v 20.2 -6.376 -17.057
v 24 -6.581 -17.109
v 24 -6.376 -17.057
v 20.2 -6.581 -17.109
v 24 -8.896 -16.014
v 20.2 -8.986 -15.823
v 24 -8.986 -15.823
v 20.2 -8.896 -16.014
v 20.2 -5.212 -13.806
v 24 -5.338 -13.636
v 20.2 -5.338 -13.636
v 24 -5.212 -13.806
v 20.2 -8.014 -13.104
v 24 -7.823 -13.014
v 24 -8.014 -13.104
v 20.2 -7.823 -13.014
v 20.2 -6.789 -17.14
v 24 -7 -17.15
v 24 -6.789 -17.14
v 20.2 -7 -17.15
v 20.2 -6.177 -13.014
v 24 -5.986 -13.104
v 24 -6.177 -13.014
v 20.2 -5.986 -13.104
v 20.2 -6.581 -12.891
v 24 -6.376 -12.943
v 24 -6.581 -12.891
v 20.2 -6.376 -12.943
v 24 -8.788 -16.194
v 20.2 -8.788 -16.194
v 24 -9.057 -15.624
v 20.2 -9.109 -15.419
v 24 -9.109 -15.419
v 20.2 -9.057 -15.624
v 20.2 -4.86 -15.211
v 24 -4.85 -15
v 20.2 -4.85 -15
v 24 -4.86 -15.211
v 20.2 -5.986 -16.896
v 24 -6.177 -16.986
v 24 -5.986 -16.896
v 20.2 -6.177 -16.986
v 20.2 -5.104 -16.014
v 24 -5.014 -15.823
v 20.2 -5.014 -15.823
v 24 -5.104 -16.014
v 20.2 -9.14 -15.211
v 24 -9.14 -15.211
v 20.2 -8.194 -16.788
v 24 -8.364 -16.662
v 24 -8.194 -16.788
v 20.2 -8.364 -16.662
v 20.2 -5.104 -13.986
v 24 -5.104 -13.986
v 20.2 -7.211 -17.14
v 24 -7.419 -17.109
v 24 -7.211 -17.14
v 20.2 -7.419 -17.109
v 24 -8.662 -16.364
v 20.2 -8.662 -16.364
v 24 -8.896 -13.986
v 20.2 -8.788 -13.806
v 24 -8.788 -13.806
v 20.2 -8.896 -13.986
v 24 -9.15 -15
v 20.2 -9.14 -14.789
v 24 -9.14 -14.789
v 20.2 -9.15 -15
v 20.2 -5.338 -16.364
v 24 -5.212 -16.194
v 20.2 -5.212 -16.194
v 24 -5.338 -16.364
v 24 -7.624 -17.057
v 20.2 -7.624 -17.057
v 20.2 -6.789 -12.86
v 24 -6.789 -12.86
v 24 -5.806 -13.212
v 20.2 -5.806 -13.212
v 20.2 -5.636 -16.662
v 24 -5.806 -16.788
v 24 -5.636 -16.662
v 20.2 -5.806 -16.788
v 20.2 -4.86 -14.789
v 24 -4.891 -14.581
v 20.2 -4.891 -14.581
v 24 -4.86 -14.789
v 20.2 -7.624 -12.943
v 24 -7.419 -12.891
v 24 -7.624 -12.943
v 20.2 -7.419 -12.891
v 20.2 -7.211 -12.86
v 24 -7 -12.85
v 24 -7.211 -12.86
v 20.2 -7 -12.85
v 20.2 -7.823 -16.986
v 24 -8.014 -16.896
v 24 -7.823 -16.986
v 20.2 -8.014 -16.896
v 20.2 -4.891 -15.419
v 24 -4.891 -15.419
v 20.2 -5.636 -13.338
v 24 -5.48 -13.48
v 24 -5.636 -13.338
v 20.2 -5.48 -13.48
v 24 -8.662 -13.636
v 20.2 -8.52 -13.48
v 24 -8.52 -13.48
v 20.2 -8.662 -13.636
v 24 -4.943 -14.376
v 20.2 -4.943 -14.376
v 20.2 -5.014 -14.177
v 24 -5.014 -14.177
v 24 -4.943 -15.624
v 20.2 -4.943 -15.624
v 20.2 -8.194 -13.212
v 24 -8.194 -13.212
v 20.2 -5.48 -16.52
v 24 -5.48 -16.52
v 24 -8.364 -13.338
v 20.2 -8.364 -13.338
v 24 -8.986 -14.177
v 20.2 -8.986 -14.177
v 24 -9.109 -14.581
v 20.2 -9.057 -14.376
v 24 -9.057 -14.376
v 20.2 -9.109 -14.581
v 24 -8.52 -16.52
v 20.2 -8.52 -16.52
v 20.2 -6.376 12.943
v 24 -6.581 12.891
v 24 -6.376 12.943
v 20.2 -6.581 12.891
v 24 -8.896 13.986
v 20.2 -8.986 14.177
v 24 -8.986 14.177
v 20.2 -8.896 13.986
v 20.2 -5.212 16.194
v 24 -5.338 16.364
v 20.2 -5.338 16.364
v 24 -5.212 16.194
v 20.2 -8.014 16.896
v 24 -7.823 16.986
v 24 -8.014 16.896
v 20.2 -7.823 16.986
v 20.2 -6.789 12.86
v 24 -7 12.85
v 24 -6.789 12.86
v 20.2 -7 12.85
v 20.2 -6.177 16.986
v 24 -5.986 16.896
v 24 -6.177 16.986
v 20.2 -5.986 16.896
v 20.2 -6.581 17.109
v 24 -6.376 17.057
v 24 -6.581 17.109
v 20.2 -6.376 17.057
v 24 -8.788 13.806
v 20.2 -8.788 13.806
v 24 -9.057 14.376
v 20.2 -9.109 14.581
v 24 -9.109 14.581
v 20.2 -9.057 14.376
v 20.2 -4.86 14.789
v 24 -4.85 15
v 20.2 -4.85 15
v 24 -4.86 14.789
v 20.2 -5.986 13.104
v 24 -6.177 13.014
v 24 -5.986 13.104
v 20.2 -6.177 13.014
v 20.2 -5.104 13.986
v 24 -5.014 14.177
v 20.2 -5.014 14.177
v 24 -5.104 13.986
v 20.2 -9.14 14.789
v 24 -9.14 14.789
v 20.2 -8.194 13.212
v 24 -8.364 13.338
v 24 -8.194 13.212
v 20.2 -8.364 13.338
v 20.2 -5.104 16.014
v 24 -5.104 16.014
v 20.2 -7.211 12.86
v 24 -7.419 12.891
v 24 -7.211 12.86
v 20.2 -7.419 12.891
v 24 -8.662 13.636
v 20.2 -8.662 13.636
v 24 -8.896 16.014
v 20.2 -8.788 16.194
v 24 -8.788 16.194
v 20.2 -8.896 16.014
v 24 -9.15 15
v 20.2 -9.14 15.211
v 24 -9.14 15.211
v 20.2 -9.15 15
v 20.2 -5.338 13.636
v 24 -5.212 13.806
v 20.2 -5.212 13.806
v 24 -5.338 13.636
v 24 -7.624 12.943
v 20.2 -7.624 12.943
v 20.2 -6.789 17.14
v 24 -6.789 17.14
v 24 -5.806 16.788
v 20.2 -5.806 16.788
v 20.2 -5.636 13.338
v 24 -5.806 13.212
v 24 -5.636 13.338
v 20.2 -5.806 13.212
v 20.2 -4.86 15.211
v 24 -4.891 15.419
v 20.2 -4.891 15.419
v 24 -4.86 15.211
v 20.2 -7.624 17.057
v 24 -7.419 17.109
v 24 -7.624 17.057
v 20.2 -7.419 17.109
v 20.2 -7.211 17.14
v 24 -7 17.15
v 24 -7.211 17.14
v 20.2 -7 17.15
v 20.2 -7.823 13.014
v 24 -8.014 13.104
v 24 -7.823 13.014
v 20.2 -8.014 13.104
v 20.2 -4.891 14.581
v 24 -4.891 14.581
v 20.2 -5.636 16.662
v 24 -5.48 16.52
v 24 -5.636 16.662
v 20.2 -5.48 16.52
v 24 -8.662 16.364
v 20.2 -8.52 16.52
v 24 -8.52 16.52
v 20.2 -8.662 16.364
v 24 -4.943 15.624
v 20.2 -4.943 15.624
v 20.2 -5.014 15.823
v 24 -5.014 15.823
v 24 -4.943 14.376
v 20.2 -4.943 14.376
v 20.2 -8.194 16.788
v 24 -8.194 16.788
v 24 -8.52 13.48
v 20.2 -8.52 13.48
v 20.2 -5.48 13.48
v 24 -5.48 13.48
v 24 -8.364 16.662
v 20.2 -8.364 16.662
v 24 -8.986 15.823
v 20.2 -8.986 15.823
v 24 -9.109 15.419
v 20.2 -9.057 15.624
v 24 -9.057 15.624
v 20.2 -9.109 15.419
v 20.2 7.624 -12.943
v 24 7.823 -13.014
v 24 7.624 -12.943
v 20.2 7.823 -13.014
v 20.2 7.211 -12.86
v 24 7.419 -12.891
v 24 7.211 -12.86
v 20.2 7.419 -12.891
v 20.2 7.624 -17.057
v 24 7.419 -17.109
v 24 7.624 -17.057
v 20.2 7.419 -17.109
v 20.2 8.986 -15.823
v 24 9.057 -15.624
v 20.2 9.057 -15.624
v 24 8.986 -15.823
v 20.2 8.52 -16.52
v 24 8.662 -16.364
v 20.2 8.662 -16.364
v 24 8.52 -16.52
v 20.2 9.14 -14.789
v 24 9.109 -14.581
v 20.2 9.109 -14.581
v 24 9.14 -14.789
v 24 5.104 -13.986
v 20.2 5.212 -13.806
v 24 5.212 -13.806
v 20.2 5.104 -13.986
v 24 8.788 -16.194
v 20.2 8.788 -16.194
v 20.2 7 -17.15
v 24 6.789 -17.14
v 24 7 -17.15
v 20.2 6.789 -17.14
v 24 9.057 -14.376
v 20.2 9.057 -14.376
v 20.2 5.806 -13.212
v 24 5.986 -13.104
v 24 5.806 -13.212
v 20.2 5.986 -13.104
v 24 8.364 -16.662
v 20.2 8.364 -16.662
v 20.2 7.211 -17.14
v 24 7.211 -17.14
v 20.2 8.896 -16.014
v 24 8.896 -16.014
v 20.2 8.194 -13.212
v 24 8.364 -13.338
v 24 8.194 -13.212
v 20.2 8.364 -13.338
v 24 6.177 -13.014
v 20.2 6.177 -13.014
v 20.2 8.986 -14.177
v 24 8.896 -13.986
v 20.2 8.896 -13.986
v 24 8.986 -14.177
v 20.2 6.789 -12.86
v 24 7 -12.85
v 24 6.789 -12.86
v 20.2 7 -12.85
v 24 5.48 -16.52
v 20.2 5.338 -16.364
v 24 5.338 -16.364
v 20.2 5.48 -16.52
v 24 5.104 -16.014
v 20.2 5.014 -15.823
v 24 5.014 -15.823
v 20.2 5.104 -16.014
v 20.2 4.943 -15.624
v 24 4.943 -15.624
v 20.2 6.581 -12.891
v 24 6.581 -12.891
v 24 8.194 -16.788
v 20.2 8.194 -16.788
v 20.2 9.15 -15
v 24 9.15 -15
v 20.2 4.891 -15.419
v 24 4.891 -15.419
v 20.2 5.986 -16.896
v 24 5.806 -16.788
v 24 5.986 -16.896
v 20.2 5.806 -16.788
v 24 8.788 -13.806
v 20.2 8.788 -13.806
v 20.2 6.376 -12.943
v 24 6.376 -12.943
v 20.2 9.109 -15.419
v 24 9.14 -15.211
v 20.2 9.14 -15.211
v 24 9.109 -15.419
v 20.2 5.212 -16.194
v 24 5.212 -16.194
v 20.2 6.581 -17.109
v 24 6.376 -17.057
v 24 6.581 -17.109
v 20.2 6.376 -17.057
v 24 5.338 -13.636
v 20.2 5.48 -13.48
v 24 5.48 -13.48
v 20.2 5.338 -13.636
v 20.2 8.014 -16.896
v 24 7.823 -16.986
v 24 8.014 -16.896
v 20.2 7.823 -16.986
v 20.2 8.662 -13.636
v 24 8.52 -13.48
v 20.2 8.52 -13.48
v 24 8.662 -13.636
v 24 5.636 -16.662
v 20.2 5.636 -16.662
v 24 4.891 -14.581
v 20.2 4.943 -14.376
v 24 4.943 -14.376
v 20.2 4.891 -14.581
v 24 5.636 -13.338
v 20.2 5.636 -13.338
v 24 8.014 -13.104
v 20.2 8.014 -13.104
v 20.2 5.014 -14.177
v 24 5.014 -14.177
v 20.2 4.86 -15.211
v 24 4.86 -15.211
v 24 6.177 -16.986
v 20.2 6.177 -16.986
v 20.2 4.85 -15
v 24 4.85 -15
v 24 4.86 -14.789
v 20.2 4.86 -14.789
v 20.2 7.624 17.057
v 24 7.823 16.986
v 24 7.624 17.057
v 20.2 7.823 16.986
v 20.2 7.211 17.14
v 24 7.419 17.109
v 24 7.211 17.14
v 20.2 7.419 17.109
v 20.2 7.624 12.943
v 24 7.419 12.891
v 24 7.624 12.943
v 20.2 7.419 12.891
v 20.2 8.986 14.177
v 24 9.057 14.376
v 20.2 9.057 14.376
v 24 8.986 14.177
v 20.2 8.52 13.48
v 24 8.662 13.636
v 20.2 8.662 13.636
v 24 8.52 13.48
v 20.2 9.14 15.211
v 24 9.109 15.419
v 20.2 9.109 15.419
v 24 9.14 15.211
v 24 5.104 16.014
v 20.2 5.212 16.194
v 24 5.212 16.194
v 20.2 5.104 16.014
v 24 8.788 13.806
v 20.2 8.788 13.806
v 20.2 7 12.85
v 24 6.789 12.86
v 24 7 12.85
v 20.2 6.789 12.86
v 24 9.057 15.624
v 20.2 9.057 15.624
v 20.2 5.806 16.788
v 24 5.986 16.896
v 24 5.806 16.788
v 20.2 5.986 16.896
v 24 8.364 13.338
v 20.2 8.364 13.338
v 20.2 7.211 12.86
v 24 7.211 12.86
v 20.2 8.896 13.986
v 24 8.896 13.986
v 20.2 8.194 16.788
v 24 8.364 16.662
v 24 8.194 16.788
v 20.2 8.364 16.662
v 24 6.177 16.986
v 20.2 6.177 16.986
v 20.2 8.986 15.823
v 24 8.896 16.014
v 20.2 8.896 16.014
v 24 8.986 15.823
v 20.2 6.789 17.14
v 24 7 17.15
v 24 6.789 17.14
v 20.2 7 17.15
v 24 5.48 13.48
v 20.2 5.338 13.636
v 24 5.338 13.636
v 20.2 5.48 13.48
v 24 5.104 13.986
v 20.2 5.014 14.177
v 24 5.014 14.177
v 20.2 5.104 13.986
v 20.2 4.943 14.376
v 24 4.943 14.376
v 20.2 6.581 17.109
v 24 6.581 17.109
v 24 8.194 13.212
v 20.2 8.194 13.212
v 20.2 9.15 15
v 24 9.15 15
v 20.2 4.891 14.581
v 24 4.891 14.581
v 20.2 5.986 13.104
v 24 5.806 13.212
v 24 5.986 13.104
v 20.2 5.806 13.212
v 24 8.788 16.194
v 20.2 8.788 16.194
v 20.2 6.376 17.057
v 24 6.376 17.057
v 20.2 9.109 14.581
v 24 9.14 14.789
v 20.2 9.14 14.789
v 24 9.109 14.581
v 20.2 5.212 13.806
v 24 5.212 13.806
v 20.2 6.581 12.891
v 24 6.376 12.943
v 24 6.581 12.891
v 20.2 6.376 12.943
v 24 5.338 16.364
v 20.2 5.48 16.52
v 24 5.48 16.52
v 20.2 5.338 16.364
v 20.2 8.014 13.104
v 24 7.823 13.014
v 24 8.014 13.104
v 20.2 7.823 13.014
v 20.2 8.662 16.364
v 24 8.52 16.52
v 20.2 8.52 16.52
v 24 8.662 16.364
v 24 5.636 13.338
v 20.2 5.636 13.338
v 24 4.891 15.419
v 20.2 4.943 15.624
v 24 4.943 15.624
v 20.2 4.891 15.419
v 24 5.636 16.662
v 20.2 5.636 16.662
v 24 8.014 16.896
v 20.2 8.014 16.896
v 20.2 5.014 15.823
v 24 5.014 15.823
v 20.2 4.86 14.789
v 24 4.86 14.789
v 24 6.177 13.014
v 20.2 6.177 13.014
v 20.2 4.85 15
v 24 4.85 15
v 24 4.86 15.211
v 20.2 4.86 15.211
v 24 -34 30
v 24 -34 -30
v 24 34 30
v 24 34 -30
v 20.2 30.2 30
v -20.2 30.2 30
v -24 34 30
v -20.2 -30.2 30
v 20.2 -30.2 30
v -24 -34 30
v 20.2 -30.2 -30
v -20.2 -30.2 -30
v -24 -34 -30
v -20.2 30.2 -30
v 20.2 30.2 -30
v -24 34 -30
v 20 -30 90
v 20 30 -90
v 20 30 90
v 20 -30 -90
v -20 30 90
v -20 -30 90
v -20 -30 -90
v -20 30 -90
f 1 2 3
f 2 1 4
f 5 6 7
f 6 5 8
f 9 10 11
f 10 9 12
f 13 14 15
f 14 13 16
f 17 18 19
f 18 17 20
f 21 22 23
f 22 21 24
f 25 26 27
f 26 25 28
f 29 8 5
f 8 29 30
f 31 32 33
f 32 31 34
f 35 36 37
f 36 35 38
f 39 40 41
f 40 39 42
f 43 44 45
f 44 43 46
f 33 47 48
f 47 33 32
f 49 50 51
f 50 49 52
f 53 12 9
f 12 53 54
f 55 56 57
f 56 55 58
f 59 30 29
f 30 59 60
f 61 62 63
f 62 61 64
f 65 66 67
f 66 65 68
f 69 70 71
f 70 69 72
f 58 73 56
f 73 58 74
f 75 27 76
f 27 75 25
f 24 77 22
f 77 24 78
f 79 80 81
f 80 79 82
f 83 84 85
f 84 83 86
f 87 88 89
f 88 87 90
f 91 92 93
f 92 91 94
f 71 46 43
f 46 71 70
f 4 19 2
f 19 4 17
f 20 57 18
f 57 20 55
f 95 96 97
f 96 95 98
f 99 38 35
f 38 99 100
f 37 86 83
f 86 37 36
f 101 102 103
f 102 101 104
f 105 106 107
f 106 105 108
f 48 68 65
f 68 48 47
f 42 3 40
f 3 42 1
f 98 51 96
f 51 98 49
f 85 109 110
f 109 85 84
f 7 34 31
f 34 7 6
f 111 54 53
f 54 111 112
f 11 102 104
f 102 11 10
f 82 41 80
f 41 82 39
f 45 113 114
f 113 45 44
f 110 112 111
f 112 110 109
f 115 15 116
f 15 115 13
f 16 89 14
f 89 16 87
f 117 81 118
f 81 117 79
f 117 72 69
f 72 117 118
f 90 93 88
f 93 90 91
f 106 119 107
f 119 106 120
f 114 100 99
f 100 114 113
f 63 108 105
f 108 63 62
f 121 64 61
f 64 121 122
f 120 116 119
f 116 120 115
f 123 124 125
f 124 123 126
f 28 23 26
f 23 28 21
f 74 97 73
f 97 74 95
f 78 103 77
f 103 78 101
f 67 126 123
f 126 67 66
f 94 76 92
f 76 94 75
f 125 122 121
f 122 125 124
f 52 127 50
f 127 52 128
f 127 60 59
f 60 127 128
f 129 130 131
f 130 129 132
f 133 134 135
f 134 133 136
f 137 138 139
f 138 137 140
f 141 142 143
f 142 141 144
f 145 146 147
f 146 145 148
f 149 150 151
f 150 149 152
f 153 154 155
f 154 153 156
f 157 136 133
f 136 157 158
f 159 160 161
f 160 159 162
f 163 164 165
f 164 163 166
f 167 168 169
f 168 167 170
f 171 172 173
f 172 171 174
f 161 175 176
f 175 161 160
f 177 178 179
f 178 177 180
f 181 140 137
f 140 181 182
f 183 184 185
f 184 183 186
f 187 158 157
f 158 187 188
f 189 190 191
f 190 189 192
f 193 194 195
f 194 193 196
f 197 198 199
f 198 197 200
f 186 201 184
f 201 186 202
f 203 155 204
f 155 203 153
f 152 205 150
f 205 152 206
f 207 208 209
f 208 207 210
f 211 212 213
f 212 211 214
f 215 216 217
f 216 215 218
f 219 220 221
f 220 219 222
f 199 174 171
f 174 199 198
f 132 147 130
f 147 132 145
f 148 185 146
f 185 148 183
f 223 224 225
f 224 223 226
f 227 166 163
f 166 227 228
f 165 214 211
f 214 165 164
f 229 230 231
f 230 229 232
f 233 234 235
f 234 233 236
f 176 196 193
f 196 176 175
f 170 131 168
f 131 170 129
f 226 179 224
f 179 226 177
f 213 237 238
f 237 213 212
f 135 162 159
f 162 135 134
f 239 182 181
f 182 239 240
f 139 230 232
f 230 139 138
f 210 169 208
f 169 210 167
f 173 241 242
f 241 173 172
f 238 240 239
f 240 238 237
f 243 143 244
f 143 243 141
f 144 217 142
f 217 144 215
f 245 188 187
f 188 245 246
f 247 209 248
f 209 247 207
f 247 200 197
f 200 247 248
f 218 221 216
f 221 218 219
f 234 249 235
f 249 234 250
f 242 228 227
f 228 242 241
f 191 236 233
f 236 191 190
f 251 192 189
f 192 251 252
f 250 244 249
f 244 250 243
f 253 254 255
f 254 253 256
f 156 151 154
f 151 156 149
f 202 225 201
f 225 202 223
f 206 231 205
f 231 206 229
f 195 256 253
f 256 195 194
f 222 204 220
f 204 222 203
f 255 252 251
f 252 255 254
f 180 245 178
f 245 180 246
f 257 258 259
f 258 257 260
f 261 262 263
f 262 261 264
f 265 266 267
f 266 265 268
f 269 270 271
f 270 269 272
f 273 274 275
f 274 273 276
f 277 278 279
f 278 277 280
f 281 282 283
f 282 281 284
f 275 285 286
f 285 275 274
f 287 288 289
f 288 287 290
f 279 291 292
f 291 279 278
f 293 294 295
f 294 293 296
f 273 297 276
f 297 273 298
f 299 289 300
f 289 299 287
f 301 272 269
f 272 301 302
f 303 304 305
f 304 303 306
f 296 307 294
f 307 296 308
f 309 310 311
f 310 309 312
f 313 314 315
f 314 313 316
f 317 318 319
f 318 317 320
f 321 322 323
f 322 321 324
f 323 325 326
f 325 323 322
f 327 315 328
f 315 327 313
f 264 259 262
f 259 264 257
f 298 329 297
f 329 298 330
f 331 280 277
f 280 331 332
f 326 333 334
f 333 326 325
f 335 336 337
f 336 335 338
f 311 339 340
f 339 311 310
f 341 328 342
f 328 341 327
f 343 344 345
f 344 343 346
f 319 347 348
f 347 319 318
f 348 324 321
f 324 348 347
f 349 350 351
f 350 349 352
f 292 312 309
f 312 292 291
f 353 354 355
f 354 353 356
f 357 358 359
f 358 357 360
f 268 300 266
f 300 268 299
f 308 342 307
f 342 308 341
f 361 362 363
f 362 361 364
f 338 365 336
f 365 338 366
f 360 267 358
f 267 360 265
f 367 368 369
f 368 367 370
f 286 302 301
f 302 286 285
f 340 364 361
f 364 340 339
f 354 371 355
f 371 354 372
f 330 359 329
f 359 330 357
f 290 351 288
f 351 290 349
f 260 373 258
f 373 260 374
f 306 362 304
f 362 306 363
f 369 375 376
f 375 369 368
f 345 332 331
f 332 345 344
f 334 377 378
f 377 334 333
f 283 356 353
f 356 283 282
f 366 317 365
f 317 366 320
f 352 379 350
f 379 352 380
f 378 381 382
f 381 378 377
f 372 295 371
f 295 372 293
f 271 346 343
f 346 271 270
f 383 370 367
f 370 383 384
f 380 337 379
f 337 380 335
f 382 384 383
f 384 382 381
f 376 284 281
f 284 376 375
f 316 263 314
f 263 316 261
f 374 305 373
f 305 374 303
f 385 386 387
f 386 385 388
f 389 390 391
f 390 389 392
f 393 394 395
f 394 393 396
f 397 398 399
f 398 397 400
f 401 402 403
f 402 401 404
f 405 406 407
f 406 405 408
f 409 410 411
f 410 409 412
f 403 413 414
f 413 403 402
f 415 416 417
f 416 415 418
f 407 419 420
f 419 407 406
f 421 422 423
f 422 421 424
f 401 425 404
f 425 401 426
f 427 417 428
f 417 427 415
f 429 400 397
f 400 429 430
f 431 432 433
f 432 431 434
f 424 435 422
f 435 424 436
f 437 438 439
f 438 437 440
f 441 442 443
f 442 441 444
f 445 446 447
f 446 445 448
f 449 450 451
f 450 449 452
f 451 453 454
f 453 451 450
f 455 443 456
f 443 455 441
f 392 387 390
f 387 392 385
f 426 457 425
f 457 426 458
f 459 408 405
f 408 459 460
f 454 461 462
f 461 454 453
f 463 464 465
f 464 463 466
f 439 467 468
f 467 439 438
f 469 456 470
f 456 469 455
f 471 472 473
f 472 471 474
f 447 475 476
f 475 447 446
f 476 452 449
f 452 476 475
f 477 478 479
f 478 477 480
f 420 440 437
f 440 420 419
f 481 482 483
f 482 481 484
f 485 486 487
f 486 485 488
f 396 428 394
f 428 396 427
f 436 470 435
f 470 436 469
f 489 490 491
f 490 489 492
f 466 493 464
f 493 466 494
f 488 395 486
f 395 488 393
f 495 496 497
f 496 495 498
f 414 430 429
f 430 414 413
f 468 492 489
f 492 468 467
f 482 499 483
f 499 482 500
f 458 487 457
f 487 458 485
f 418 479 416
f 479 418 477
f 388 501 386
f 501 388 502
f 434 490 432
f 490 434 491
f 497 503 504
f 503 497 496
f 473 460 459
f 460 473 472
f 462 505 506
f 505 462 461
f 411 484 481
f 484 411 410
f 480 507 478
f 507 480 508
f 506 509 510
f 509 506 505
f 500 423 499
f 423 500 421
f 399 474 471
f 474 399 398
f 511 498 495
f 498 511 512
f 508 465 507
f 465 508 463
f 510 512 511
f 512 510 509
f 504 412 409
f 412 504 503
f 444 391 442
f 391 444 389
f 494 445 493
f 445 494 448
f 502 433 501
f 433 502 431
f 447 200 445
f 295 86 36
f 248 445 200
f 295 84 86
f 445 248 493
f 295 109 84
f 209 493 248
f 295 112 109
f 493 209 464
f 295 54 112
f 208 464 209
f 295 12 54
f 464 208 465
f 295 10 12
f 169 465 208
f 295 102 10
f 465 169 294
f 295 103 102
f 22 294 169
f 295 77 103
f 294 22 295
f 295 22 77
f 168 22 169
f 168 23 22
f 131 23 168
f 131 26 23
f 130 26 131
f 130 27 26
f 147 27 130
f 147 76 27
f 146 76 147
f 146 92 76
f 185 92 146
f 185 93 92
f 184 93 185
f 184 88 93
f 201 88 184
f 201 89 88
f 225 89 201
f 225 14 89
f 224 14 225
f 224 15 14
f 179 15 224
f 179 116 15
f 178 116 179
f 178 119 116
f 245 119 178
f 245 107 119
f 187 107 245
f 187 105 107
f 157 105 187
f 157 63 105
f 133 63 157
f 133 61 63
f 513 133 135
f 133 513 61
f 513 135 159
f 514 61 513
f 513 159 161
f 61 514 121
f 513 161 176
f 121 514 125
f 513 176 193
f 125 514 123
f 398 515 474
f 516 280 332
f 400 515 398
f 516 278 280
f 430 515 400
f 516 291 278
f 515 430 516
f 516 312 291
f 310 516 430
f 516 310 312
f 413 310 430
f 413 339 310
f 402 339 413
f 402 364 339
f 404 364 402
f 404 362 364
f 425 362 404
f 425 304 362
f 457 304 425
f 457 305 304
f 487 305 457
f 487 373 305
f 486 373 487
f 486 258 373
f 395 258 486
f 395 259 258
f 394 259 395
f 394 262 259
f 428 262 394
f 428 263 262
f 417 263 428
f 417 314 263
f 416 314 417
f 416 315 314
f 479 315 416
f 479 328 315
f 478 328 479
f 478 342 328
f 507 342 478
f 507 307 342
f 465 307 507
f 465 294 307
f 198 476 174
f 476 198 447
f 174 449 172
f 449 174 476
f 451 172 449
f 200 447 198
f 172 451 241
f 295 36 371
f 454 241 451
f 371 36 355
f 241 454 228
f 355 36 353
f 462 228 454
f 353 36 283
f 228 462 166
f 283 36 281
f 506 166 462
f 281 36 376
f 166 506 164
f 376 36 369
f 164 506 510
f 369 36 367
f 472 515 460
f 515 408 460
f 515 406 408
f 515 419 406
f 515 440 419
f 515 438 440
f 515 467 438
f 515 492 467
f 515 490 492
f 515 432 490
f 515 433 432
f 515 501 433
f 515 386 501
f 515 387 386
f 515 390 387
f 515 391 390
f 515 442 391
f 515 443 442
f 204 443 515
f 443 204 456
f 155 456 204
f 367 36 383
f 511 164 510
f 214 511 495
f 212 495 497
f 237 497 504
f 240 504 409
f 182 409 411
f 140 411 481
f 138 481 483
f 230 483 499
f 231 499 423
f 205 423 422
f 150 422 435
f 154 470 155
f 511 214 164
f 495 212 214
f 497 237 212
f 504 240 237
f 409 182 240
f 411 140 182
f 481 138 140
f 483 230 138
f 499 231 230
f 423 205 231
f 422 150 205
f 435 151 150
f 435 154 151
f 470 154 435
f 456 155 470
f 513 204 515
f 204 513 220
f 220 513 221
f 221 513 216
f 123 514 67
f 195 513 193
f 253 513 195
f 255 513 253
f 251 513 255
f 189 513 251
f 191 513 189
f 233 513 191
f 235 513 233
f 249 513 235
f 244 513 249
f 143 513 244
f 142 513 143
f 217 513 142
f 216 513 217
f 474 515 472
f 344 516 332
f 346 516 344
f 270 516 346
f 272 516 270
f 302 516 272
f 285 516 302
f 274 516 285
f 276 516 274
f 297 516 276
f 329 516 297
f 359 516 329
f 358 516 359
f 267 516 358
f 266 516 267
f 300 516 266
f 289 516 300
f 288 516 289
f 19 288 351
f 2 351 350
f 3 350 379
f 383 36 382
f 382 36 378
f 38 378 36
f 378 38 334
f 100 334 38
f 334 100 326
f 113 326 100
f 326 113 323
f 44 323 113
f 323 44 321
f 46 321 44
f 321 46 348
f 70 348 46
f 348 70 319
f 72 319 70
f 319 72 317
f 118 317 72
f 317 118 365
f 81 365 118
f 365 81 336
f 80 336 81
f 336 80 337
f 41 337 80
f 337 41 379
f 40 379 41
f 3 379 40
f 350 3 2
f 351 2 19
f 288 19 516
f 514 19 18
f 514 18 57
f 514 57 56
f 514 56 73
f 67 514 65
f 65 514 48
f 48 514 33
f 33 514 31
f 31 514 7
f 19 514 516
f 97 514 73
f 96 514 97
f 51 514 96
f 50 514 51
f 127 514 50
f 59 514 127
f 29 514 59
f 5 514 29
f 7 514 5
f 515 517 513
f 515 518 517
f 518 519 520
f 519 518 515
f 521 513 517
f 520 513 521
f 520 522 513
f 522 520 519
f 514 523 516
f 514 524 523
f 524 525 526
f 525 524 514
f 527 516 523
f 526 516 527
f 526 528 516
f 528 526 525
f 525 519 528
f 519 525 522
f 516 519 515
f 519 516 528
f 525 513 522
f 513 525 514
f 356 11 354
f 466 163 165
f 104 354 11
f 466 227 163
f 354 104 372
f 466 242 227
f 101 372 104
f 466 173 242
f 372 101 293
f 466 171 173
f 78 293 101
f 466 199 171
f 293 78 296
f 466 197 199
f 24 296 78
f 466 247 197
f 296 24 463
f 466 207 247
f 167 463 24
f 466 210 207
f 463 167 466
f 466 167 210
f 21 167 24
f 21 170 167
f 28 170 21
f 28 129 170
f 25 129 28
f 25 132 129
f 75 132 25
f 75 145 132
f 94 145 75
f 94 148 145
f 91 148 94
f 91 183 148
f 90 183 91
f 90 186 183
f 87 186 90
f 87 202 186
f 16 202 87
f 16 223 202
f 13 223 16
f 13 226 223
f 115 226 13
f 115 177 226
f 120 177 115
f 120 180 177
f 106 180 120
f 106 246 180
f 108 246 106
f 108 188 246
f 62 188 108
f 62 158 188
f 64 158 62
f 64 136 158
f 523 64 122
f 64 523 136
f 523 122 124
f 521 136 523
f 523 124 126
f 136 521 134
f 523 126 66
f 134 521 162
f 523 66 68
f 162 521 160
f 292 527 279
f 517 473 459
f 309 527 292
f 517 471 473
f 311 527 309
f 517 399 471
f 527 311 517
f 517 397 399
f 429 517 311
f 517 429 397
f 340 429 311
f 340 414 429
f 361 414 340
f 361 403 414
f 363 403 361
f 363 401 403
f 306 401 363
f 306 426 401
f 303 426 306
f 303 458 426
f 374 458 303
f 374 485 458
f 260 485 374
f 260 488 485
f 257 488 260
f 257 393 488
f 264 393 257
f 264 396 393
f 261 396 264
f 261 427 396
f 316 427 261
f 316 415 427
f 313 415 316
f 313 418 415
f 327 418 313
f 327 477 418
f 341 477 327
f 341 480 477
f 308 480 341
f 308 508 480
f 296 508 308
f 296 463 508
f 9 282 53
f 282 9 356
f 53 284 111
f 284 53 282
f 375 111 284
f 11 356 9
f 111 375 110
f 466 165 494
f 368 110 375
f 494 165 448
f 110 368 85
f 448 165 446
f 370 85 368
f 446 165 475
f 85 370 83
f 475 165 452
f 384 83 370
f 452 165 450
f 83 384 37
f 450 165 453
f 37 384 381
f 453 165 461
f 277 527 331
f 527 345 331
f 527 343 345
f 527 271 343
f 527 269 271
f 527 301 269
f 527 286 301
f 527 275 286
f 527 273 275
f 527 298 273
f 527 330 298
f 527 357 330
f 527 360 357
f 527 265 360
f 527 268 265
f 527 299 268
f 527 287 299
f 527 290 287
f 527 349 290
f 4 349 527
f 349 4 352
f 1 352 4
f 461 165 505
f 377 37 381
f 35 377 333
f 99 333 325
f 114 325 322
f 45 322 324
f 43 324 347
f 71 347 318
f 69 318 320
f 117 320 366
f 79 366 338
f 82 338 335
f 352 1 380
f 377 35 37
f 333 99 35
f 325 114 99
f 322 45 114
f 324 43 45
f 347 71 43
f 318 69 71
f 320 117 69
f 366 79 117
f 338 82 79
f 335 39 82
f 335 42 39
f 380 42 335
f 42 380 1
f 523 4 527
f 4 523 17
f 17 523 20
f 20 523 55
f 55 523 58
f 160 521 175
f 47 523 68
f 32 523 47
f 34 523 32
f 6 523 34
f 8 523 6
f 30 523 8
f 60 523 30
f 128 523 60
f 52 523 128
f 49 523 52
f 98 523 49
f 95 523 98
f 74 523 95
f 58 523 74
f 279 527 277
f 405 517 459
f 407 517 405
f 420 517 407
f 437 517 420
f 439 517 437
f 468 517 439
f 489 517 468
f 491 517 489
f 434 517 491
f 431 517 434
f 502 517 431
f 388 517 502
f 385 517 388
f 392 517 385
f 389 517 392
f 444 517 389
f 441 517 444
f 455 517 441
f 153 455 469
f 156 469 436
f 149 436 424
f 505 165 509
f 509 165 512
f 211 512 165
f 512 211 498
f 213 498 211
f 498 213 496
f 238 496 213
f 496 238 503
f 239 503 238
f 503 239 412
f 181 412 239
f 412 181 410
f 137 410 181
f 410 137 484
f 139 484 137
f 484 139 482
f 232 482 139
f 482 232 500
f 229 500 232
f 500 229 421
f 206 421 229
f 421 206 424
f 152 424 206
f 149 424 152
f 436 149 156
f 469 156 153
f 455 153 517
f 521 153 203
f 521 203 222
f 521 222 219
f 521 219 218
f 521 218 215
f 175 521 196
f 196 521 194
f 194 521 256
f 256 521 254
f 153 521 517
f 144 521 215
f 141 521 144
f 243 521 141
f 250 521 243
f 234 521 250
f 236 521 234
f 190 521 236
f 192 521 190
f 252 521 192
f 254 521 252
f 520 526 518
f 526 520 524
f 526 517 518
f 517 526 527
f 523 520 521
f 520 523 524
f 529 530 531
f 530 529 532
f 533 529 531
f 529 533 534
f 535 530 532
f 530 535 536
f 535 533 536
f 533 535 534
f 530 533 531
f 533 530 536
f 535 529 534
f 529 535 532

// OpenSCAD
// =====================================================================
//  Wrap-around bracket for the OTHER hinge leaf (the rotating arm)
//
//  Same idea as hinge_bracket.scad, but for the arm end:
//    - 4 screws, 4.3 clearance, on a 14 x 30 pattern
//      (two 2-hole tabs: 14 across, 30 between the tabs)
//    - no central boss, so the face stays flat
//
//  The 4 screws pass through the bracket wall into the wood.
// =====================================================================

/* [Wood] */
wood_width  = 60;    // across the face the hinge mounts on
wood_depth  = 40;    // thickness, away from that face
clearance   = 0.4;   // slip-fit gap around the wood

/* [Bracket] */
wall        = 4;     // wall thickness
length      = 60;    // along the wood (covers the 50 tall tab span)

/* [Arm mounting] */
hole_dx     = 14;    // screw spacing across the face (per tab)
hole_dz     = 30;    // screw spacing along the length (tab to tab)
hole_d      = 4.3;   // M4 clearance hole

/* [View] */
part        = "assembly";  // [bracket, wood, assembly]
show_wood   = true;

$fn = 64;

// ---------------------------------------------------------------------
outer_x = wood_depth + 2 * wall;
outer_y = wood_width + 2 * wall;

module wood() {
    color("burlywood", 0.75)
        cube([wood_depth, wood_width, length + 120], center = true);
}

module bracket() {
    difference() {
        // outer shell
        cube([outer_x, outer_y, length], center = true);

        // wood cavity, open both ends
        cube([wood_depth + clearance,
              wood_width + clearance,
              length + 2], center = true);

        // 4 screw clearance holes through the mounting wall (+X)
        for (sy = [-1, 1], sz = [-1, 1])
            translate([outer_x / 2, sy * hole_dx / 2, sz * hole_dz / 2])
                rotate([0, 90, 0])
                    cylinder(d = hole_d, h = wall * 3, center = true);
    }
}

// ---------------------------------------------------------------------
if (part == "wood") {
    wood();
} else if (part == "bracket") {
    bracket();
} else {
    bracket();
    if (show_wood) wood();
}
